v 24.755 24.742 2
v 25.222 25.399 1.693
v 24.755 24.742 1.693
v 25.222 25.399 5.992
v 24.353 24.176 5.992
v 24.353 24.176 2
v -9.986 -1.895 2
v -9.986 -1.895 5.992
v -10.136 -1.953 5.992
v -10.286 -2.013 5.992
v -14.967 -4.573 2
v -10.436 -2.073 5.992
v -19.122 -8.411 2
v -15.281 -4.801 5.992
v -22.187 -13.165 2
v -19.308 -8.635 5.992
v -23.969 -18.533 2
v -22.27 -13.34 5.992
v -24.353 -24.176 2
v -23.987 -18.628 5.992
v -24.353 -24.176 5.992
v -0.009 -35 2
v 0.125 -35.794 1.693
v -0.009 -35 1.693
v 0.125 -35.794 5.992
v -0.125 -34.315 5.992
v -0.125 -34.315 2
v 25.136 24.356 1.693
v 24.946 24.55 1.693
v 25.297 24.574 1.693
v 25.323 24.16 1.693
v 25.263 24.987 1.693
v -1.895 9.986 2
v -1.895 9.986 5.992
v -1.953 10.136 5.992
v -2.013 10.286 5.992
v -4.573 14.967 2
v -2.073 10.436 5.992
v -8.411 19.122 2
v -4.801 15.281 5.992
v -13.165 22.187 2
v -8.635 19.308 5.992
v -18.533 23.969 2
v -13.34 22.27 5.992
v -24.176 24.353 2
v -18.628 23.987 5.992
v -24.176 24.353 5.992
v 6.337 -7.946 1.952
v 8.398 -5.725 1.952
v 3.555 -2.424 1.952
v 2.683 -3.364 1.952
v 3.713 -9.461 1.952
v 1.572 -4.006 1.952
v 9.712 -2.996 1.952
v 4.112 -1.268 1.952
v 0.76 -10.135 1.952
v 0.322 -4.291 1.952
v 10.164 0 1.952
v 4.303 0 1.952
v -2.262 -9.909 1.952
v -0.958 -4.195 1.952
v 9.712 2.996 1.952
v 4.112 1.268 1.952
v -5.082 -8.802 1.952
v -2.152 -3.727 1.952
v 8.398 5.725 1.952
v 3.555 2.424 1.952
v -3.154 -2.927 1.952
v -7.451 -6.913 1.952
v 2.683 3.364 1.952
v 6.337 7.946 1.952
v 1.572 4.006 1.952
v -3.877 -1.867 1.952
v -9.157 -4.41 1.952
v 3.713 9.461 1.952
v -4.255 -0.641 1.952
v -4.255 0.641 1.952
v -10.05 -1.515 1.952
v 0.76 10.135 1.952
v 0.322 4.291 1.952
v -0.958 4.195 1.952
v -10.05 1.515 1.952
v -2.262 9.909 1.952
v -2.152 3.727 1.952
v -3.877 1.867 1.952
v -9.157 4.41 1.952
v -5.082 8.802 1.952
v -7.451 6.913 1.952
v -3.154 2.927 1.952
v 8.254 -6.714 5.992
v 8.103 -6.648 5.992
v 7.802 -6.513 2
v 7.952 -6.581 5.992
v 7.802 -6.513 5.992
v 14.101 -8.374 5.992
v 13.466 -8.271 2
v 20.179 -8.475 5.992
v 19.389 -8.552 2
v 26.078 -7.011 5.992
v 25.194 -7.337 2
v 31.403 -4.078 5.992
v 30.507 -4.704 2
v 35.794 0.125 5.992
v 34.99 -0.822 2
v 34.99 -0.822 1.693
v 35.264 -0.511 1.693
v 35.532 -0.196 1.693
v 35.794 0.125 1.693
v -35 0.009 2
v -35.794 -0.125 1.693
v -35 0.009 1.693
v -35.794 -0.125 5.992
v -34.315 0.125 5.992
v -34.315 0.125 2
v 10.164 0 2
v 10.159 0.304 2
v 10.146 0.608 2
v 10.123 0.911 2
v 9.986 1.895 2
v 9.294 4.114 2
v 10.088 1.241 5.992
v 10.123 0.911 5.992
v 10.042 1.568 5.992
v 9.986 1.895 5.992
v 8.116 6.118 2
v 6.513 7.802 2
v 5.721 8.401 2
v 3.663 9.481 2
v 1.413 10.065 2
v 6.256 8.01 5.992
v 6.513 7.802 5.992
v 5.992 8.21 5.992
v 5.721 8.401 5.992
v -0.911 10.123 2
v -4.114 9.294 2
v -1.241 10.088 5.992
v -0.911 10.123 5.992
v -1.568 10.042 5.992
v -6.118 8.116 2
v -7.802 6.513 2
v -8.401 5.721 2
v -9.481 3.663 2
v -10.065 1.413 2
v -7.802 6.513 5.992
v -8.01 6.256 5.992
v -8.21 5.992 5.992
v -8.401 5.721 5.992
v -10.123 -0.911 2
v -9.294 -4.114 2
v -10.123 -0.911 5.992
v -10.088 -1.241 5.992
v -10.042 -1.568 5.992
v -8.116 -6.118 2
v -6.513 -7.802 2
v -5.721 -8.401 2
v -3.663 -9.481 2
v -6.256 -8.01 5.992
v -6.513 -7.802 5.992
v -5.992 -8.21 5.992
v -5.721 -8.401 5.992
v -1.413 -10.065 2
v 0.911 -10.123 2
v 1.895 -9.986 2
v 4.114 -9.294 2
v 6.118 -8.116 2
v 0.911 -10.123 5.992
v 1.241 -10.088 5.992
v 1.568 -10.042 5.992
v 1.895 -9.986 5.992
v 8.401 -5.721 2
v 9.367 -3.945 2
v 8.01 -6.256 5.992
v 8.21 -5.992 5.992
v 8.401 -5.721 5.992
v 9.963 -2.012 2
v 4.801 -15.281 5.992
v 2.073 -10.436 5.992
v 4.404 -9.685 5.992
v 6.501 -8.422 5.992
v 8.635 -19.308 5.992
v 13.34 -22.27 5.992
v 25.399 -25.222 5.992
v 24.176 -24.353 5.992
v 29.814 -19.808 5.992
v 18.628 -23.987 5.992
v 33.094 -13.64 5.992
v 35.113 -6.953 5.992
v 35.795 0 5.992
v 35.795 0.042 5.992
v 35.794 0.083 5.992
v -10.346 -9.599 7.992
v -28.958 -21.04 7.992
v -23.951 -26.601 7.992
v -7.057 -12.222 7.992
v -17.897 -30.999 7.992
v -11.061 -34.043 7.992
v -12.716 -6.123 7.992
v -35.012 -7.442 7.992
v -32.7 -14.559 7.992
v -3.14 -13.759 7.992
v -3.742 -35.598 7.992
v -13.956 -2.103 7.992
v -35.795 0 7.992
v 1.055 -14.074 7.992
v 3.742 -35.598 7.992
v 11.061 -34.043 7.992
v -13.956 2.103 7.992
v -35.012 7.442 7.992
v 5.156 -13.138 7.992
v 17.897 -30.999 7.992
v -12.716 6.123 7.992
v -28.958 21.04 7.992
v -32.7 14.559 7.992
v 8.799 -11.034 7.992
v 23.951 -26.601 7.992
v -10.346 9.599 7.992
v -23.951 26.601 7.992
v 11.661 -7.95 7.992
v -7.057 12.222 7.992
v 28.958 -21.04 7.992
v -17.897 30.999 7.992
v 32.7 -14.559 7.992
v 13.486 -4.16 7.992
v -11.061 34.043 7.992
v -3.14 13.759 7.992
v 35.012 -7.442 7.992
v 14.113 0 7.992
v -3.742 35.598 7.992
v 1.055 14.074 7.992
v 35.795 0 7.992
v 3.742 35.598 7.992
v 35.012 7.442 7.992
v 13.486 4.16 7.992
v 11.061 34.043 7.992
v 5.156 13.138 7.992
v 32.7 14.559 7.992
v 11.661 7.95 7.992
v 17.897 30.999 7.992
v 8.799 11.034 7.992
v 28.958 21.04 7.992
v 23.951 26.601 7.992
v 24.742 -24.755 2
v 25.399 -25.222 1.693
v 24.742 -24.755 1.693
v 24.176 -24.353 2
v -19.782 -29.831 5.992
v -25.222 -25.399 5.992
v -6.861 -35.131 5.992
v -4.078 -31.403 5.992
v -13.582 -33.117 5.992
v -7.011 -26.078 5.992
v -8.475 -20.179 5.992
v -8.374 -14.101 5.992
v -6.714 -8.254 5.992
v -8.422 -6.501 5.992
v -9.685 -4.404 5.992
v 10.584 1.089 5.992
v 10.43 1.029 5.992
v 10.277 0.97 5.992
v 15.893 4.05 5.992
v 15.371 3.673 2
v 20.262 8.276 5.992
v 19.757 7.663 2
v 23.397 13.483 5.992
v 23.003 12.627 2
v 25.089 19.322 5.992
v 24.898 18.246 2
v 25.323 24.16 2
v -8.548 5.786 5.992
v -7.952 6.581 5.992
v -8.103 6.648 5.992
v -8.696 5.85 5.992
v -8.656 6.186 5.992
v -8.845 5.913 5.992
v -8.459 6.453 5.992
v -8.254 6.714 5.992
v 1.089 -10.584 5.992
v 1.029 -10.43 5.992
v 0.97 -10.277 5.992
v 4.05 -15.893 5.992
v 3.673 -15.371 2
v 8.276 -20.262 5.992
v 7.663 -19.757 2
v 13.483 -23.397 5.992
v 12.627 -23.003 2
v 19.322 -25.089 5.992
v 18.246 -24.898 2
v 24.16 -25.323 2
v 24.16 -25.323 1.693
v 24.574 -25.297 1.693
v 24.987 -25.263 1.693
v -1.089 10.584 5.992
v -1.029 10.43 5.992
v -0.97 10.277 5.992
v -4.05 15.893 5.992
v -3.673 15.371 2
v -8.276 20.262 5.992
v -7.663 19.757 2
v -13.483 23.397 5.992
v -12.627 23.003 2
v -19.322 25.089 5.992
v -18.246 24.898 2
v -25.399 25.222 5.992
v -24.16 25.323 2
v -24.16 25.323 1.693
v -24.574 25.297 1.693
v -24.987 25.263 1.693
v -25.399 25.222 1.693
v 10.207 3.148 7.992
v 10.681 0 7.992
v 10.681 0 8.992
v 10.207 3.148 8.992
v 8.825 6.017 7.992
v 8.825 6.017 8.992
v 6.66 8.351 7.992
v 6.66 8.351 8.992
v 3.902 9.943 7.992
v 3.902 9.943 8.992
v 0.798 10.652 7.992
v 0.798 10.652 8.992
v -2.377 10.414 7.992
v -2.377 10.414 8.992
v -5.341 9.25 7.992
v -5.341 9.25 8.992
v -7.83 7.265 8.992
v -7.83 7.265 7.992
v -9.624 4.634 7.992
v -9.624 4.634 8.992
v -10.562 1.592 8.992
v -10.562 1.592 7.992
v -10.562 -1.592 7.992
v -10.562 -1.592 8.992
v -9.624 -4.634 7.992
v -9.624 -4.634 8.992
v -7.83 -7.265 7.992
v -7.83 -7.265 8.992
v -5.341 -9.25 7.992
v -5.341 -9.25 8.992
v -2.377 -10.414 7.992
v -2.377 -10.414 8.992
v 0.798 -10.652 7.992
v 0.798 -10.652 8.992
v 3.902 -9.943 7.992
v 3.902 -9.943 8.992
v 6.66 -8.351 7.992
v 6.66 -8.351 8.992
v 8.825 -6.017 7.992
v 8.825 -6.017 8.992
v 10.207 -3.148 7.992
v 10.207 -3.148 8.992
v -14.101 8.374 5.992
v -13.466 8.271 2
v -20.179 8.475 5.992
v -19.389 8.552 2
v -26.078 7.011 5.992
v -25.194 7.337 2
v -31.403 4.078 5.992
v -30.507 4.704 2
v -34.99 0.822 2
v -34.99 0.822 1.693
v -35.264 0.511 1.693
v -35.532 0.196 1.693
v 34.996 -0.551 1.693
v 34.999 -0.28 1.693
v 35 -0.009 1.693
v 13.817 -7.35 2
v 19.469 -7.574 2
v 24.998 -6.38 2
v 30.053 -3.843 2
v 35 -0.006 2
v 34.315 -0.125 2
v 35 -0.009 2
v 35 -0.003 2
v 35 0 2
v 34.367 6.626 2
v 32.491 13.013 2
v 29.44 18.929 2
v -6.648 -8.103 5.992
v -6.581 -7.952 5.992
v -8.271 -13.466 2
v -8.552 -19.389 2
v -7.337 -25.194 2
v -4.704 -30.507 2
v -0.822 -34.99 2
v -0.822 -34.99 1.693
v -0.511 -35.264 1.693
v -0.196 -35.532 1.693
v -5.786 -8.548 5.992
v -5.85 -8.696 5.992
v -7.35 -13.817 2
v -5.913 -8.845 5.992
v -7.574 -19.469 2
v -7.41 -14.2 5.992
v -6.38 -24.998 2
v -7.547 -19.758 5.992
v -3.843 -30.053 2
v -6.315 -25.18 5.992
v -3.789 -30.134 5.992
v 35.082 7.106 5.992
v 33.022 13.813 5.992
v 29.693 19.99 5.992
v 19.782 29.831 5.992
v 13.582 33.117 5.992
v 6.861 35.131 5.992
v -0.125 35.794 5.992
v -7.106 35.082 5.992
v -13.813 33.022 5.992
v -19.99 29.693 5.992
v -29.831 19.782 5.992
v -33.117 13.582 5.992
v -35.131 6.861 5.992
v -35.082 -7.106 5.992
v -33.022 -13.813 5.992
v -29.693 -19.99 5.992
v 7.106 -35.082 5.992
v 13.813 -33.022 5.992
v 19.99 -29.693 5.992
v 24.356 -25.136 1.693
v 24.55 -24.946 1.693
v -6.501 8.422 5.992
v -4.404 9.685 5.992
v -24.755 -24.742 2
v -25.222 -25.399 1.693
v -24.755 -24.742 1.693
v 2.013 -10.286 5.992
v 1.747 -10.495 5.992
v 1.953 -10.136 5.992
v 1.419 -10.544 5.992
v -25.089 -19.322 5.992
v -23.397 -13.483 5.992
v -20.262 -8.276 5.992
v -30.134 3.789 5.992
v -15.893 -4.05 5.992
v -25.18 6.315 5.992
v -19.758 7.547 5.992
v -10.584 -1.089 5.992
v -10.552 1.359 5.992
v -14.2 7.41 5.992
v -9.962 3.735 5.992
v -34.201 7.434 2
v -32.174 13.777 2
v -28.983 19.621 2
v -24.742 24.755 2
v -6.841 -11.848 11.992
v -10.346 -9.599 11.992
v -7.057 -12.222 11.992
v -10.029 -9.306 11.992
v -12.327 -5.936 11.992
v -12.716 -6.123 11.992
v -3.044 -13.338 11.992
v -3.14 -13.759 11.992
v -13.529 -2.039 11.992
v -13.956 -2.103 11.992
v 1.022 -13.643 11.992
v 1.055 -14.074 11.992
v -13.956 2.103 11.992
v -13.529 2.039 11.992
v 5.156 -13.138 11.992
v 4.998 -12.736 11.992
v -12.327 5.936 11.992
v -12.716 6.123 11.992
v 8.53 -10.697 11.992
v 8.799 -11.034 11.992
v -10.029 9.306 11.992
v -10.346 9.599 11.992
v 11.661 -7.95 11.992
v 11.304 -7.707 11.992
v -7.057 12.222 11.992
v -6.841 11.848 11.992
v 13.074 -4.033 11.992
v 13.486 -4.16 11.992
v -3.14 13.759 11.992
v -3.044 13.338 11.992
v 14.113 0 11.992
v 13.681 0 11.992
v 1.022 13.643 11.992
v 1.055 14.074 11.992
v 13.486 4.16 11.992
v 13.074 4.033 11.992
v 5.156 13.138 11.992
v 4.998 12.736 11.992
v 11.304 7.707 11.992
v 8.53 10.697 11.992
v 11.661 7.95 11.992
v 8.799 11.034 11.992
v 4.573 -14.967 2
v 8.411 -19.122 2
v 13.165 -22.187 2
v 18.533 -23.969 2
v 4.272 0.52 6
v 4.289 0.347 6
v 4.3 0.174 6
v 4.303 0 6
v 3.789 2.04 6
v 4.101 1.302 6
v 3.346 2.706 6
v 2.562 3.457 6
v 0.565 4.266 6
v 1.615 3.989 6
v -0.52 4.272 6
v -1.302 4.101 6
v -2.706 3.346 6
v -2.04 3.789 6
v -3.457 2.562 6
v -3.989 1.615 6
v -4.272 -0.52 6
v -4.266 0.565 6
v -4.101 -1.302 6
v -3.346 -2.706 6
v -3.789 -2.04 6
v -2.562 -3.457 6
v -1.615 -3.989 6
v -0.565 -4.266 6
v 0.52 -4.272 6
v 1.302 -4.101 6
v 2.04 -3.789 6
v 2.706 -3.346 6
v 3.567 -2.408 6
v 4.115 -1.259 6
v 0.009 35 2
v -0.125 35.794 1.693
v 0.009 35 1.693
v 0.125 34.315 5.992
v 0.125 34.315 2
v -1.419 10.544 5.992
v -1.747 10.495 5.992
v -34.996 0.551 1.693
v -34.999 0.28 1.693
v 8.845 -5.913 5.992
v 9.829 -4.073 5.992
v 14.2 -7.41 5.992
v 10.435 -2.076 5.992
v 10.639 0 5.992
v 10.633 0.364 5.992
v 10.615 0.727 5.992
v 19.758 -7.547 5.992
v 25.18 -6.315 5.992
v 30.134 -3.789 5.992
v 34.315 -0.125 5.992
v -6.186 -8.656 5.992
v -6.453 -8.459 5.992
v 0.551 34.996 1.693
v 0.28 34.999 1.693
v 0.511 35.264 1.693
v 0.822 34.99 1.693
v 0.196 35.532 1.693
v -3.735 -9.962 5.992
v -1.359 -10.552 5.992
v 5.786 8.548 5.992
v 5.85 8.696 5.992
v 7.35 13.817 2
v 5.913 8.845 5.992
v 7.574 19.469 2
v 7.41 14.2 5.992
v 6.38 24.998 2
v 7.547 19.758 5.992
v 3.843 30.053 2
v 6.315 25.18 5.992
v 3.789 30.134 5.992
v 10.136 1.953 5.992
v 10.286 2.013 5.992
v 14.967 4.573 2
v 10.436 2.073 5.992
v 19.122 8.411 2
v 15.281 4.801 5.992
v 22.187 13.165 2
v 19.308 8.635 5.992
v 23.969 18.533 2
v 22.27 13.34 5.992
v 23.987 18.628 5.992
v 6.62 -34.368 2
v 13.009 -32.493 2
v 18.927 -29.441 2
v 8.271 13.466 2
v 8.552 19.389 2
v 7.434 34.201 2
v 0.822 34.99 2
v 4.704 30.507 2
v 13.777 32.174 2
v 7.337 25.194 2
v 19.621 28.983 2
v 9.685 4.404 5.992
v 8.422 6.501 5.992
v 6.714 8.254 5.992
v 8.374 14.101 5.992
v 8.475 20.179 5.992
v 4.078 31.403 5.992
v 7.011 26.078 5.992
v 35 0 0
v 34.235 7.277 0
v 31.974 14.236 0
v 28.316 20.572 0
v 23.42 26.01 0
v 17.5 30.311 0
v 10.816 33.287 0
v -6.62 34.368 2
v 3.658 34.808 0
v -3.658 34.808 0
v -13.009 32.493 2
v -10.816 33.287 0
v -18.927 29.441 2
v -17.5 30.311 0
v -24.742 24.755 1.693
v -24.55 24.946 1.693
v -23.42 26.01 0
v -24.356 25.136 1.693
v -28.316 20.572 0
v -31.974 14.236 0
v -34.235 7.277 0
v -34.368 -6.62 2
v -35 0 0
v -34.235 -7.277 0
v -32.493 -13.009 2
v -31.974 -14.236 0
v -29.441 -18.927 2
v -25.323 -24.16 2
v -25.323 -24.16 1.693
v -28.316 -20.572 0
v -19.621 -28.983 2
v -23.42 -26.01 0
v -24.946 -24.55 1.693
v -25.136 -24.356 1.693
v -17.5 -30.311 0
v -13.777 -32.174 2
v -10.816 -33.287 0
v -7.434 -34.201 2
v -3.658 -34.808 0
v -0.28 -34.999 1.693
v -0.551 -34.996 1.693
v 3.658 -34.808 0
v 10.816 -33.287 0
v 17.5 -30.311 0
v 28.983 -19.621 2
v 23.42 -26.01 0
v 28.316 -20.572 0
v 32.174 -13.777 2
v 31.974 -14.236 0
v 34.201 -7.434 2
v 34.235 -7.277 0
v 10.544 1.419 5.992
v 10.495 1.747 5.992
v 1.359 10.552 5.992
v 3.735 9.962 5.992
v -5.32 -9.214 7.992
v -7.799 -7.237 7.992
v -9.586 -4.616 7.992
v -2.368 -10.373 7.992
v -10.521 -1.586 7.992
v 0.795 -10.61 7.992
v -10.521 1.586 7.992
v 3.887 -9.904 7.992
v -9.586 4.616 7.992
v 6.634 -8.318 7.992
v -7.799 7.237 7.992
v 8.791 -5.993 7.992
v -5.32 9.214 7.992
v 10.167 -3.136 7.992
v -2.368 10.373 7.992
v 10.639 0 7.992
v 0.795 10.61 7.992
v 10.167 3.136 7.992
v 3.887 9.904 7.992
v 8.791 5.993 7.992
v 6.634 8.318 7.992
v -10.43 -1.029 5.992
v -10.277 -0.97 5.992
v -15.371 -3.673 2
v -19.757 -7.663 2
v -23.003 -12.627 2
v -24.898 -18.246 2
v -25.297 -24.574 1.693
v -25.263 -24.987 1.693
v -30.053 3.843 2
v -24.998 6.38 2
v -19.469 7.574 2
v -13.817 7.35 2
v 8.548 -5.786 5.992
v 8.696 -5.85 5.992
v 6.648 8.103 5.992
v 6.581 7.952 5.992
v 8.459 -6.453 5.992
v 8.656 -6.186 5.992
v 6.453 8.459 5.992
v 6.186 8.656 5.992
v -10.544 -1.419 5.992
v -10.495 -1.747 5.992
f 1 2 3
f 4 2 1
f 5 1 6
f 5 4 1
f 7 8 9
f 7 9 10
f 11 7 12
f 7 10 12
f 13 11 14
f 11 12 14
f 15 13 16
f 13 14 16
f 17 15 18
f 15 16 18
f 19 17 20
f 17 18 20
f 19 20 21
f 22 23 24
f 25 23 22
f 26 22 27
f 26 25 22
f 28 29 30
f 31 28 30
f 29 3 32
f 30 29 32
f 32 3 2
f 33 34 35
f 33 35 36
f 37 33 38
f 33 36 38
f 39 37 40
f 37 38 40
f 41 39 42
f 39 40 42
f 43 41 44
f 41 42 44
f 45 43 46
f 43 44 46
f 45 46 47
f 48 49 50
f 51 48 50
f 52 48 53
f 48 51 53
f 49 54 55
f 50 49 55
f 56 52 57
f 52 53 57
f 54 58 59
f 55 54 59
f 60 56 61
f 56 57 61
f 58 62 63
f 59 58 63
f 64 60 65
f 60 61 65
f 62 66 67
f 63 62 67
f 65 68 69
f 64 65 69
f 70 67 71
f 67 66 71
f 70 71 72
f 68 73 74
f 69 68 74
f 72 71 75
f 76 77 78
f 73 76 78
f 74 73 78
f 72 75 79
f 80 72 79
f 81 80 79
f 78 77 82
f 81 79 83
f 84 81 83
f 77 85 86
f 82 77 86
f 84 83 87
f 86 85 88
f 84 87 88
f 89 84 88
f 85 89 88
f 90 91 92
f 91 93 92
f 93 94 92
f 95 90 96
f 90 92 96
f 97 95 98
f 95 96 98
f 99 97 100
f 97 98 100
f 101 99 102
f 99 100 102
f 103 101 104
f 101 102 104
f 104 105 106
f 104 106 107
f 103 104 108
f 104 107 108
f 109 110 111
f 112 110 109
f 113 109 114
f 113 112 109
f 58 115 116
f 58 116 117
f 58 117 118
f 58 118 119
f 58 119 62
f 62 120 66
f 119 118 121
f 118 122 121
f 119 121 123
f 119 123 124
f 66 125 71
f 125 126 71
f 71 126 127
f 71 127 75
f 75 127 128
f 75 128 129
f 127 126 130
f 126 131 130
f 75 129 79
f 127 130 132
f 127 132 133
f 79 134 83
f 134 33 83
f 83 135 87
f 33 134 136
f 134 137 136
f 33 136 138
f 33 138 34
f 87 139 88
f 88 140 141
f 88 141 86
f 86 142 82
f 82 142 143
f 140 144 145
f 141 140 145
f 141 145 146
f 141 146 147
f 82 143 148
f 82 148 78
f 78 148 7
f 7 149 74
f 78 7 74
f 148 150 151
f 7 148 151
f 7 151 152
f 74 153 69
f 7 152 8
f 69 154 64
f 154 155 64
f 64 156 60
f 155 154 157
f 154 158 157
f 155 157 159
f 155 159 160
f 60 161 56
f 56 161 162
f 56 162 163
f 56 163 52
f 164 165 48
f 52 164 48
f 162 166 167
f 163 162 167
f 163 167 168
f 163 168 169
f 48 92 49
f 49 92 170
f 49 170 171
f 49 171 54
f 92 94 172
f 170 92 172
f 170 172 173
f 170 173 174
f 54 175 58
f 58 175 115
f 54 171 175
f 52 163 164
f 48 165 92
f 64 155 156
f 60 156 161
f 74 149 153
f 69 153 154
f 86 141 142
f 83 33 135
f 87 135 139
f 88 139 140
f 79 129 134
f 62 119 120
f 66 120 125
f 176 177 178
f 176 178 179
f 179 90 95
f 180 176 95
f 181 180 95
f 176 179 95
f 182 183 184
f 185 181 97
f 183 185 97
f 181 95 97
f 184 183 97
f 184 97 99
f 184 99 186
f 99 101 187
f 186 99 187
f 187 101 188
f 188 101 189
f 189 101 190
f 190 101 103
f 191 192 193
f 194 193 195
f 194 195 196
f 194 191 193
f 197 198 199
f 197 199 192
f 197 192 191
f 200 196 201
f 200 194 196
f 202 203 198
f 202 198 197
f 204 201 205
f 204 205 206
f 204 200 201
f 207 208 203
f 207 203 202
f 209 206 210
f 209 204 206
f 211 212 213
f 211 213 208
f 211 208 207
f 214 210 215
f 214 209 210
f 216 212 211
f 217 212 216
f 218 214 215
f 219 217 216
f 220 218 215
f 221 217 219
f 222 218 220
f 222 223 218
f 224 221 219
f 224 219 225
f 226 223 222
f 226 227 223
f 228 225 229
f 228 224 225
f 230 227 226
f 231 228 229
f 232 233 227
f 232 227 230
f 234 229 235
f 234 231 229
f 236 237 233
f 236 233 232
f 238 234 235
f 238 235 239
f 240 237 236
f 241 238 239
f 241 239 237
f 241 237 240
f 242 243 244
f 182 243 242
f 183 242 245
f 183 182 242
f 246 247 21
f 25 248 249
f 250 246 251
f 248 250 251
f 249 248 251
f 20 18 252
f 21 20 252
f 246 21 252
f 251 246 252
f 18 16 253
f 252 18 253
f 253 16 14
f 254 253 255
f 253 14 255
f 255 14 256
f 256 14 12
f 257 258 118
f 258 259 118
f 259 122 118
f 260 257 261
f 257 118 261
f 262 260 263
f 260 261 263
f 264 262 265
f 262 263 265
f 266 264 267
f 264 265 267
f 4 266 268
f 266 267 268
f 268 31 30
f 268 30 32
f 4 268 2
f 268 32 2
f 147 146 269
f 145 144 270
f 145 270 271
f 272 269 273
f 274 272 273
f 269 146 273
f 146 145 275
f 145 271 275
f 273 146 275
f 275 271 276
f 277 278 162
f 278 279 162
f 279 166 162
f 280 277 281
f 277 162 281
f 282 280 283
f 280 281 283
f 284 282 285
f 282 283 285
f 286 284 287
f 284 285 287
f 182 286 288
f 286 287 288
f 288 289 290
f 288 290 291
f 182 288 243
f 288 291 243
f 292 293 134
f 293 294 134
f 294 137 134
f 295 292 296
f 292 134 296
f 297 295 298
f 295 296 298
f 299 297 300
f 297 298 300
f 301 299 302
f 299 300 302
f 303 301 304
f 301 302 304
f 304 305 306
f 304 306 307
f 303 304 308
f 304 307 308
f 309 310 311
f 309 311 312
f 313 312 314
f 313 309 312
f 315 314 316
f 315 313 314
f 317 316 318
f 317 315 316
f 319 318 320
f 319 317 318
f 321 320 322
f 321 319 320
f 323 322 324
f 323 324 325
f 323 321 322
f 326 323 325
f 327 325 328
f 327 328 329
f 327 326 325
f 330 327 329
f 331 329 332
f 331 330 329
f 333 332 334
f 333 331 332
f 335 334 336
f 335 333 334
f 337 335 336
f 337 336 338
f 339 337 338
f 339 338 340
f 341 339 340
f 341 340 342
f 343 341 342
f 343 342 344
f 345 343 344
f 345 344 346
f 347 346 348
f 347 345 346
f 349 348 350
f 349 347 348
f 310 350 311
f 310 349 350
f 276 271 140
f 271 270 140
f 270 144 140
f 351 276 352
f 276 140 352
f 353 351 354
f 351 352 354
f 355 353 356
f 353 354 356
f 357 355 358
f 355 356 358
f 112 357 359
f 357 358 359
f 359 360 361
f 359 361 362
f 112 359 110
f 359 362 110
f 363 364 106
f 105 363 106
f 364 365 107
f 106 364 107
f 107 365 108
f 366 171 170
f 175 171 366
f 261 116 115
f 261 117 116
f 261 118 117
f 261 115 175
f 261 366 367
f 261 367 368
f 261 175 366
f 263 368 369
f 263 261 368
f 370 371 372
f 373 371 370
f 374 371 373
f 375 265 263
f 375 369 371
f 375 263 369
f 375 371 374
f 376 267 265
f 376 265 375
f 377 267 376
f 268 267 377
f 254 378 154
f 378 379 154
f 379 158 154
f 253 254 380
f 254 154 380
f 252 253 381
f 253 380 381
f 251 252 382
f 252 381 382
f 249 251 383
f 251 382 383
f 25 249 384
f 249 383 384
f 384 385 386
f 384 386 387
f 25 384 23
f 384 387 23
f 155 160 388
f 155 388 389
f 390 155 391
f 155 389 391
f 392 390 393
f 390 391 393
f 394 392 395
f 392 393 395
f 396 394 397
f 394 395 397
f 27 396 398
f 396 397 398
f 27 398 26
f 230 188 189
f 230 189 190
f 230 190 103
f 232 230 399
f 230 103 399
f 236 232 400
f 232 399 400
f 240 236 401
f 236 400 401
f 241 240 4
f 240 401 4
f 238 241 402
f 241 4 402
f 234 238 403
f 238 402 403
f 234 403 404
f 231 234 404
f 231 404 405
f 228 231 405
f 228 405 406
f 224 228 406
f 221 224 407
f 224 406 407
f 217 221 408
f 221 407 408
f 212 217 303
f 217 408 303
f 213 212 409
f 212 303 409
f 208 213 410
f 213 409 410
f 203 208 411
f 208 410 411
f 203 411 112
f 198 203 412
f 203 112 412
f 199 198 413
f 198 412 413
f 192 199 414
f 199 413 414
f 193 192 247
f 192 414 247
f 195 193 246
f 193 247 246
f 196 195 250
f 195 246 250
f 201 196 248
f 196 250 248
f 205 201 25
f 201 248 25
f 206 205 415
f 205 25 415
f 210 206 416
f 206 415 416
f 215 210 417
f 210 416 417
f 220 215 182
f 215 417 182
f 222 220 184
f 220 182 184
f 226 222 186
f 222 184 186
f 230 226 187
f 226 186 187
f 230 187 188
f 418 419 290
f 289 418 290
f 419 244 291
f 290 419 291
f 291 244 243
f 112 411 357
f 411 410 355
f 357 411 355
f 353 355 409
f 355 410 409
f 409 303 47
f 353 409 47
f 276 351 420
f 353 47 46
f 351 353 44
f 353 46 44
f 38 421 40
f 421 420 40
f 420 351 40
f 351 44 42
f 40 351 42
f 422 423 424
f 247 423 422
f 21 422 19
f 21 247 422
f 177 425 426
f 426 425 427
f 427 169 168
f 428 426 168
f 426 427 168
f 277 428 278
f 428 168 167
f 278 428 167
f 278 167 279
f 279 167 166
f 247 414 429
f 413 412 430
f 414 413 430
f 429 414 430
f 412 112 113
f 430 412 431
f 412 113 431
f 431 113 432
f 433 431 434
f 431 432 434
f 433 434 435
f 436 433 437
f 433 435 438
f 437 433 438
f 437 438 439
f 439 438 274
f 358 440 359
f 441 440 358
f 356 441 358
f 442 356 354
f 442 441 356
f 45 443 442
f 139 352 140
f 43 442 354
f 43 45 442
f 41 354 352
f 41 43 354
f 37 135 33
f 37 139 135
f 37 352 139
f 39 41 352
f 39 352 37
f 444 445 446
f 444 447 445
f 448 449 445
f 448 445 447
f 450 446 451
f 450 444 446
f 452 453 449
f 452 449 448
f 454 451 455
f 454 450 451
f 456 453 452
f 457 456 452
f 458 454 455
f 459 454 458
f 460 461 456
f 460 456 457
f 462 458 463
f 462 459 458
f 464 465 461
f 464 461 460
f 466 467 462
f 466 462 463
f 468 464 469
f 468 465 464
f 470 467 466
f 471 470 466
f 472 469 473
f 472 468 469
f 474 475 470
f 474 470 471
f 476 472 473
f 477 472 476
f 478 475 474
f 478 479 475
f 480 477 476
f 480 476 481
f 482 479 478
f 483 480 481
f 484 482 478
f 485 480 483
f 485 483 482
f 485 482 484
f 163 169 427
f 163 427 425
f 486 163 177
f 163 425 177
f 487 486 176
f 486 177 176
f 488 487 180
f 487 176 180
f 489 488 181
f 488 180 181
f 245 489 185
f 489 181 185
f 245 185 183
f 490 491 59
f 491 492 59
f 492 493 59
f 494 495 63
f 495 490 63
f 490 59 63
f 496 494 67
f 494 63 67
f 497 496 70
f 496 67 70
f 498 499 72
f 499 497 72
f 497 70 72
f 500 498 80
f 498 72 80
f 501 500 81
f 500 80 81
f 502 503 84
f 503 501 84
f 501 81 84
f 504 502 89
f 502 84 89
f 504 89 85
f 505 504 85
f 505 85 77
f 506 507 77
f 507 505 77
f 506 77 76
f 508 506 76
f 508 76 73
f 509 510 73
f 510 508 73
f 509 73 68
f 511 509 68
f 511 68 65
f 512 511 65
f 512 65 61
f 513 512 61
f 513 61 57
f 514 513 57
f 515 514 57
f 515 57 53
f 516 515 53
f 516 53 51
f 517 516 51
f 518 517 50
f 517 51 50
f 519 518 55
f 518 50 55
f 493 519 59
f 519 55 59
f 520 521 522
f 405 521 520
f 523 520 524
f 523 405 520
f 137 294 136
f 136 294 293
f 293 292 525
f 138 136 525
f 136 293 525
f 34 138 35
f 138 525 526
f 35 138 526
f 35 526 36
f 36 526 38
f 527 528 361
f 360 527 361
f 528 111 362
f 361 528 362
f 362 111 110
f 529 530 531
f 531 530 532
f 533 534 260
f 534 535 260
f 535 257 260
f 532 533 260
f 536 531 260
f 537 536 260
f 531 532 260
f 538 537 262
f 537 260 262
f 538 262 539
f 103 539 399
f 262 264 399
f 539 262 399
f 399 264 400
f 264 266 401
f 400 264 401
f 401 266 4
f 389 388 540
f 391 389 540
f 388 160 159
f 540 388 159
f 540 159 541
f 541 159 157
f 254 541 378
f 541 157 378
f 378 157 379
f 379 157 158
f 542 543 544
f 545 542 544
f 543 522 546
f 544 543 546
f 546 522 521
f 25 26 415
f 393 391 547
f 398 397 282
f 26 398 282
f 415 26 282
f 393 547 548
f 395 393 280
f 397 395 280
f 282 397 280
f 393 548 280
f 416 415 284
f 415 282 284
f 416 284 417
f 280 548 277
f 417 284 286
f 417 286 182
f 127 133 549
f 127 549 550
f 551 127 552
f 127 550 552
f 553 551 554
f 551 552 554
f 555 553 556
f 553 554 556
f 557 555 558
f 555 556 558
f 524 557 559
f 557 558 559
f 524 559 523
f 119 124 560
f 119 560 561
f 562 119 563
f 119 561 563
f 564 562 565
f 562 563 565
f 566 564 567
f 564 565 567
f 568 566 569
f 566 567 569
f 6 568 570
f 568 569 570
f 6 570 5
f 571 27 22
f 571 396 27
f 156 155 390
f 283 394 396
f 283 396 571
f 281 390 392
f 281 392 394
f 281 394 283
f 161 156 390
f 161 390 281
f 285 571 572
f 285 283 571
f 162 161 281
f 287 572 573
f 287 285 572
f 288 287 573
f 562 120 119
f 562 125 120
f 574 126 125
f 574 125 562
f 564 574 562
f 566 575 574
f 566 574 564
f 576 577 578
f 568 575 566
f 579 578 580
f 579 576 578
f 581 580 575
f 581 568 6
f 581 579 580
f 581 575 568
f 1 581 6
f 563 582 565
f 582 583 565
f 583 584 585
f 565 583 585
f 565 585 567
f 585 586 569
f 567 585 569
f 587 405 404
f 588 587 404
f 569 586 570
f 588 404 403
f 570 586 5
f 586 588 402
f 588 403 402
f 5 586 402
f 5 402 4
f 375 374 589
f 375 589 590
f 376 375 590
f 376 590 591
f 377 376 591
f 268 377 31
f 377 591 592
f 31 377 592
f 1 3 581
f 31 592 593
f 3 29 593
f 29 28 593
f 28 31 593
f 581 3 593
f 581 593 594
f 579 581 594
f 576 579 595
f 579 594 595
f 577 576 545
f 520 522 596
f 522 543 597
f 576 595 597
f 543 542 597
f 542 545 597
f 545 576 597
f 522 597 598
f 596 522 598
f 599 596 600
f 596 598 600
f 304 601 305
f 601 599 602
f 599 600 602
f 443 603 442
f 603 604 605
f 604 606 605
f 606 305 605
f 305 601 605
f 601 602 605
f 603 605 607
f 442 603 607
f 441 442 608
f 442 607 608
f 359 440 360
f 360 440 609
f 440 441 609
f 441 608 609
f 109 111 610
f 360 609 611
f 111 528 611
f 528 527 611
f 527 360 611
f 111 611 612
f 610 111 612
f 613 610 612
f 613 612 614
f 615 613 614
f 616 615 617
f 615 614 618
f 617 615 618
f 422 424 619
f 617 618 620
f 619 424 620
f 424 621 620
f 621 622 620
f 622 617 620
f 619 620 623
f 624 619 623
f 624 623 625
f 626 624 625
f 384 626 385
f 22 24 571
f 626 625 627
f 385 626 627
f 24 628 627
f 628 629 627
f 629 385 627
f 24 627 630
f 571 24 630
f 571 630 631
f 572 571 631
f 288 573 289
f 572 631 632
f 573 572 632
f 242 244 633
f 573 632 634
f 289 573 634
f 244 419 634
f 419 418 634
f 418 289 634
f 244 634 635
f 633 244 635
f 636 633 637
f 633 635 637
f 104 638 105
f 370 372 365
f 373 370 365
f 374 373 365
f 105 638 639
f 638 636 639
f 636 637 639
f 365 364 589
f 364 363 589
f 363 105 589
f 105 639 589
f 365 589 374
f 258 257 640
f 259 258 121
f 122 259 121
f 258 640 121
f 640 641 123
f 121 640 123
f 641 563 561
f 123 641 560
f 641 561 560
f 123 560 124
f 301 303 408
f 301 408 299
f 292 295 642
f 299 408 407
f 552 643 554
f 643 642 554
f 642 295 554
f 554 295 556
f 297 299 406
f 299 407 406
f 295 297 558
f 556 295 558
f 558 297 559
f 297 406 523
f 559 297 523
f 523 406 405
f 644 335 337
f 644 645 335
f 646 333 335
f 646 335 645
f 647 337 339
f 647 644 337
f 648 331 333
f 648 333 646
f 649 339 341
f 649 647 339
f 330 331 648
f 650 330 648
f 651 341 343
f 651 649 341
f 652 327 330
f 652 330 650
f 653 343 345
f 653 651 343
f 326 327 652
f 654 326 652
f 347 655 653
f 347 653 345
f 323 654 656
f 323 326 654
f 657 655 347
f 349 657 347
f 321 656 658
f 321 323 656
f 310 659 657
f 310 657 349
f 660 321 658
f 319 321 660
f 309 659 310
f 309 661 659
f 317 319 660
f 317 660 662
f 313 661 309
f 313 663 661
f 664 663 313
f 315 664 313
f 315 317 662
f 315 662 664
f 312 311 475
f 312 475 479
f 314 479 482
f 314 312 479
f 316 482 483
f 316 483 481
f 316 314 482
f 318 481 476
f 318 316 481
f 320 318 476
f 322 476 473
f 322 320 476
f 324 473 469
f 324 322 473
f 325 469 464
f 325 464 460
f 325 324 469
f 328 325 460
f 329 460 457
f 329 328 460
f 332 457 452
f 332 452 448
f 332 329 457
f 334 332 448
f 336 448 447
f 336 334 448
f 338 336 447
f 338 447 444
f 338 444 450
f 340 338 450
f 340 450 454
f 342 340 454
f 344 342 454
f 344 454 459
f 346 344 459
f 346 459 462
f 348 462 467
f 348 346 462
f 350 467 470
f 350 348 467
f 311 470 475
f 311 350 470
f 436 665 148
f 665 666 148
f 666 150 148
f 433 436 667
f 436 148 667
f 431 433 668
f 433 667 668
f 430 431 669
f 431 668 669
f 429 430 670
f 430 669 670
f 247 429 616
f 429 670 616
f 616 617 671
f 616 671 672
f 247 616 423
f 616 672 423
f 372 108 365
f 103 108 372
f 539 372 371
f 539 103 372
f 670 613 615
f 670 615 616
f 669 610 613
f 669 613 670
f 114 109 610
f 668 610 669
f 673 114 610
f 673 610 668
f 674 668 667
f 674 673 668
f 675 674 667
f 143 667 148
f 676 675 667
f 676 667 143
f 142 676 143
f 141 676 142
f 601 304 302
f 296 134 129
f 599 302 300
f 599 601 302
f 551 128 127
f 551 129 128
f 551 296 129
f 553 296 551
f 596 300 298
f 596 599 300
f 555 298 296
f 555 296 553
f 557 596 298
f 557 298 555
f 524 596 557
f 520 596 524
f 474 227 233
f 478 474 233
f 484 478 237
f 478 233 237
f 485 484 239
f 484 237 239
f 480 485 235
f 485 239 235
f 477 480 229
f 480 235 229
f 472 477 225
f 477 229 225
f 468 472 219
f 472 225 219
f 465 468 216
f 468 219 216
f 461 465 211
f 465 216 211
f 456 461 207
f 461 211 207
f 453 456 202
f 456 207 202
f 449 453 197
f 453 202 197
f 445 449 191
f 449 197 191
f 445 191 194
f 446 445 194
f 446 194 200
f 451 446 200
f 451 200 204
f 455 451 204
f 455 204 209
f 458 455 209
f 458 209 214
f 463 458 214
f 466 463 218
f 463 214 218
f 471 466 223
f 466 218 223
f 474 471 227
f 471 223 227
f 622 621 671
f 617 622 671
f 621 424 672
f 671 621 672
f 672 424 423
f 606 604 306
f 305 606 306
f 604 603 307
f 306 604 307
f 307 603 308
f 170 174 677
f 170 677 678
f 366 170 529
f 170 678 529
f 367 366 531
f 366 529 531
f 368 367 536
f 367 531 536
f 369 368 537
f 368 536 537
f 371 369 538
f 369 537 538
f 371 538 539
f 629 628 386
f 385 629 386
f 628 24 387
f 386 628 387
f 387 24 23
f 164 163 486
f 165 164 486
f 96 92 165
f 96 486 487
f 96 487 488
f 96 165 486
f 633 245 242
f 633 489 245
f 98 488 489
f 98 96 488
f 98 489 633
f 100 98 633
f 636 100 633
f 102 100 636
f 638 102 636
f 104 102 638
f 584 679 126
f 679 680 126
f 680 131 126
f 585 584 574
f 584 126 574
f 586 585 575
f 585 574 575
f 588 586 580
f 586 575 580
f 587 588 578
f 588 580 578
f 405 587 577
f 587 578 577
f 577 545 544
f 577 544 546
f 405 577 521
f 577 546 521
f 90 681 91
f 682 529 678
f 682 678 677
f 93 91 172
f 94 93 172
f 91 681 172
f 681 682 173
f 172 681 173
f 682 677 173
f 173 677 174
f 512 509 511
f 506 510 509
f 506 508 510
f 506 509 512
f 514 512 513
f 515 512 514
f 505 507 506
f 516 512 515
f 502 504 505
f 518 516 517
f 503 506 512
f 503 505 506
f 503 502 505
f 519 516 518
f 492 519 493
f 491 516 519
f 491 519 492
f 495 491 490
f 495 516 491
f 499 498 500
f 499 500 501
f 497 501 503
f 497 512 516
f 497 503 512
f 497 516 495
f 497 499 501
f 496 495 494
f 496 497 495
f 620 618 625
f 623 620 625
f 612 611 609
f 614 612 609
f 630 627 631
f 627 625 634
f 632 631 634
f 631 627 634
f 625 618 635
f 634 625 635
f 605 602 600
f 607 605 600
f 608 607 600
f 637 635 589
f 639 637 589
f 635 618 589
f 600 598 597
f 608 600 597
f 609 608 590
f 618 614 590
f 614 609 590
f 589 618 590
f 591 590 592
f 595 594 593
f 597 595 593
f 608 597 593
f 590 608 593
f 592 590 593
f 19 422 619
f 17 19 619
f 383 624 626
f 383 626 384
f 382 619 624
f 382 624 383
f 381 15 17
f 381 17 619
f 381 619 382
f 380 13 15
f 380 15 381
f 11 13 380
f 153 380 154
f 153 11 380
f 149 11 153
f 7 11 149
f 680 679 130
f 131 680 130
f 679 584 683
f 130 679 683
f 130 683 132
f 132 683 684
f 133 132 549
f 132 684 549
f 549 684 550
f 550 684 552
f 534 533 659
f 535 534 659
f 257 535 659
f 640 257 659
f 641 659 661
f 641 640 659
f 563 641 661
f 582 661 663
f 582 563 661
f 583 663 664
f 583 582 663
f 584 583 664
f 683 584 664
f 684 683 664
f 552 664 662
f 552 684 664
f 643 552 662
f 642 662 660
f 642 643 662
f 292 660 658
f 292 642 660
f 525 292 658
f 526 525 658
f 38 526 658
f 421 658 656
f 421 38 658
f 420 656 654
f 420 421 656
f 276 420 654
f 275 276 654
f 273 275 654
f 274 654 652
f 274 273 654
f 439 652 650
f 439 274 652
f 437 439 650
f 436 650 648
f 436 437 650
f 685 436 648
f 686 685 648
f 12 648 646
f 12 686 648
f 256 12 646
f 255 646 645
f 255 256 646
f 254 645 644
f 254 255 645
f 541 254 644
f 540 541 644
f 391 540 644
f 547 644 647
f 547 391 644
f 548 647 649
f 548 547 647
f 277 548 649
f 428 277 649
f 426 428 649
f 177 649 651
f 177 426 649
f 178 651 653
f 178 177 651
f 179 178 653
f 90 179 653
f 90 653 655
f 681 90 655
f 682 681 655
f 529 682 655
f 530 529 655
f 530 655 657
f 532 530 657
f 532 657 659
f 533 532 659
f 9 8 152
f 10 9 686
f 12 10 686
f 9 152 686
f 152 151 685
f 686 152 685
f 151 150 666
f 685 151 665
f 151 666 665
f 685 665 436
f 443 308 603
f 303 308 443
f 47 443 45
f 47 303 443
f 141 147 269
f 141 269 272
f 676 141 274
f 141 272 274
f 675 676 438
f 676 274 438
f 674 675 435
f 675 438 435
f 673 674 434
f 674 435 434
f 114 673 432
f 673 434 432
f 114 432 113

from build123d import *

# Parameters (mm, degrees)
F0_R      = 35
F1_DEPTH  = 2
F2_R      = 5
F3_DEPTH  = 4
F4_W      = 1.5
F4_H      = 8.0229806336
F7_COUNT  = 8
F8_W      = 26.6654435545
F8_H      = 7.6421163976
F10_R     = 35.7945573746
F10_R_2   = 10.639493897
F11_DEPTH = 2
F12_R     = 7.8850304464
F13_DEPTH = 25
F14_R     = 14.11317868
F14_R_2   = 10.6813839673
F15_DEPTH = 4
F16_SIZE  = 3


with BuildPart() as f1:
    # F0 (on Top) → F1 (new body)
    with BuildSketch(Plane.XY):
        Circle(F0_R)
    extrude(amount=F1_DEPTH)



with BuildPart() as f3:
    # F2 (on face) → F3 (new body)
    with BuildSketch(Plane.XY.offset(2)):
        Circle(F2_R)
    extrude(amount=F3_DEPTH)


with BuildPart() as f6:
    # F6: sweep along a path in F5
    with BuildLine(Plane.XY) as f6_path:
        ThreePointArc((0, 0), (-8.1347441665, -17.5274070352), (0, -35.0548140705))
    # F4 (on Front) → F6 (sweep)
    with BuildSketch(Plane.XZ):
        with Locations((0, 5.7041863911)):
            Rectangle(F4_W, F4_H)
    sweep(path=f6_path.line)


with BuildPart() as f1_1:
    add(f1.part)

    add(f3.part)  # F7 merges F3

    add(f6.part)  # F7 merges F6
    # F7: F6 ×8 about axis
    f7_axis = Axis((0, 0, 6), (0, 0, 1))
    for i in range(1, F7_COUNT):
        add(f6.part.rotate(f7_axis, i * 360 / F7_COUNT))

    # F8 (on Front) → F9 (revolve, cut)
    with BuildSketch(Plane.XZ):
        with Locations((23.4964704141, 9.8134223372)):
            Rectangle(F8_W, F8_H)
        Polygon((10.1637486368, 5.9923641384), (10.1637486368, 13.634480536), (4.3031405658, 13.634480536), (4.3031405658, 1.9518490881), (10.1637486368, 1.9518490881), align=None)
    revolve(axis=Axis((0, 0, 0), (0, 0, 1)), mode=Mode.SUBTRACT)

    # F10 (on face) → F11 (join)
    with BuildSketch(Plane.XY.offset(5.9923641384)):
        Circle(F10_R)
        Circle(F10_R_2, mode=Mode.SUBTRACT)
    extrude(amount=F11_DEPTH)

    # F12 (on face) → F13 (cut)
    with BuildSketch(Plane.XY.offset(6)):
        Circle(F12_R)
        with BuildLine():
            ThreePointArc((-0.4521737471, -4.2793174258), (-1.6150666235, -3.9885559455), (-2.6526354387, -3.3882951404))
            ThreePointArc((-2.6526354387, -3.3882951404), (-1.6440902169, -2.2260491927), (-0.5583723561, -1.1355466324))
            ThreePointArc((-0.5583723561, -1.1355466324), (-0.5580653725, -2.7092153878), (-0.4521737471, -4.2793174258))
        make_face(mode=Mode.SUBTRACT)
        with BuildLine():
            ThreePointArc((-3.3456694935, -2.7061992478), (-3.9623595177, -1.6783103947), (-4.2715829771, -0.5201899637))
            ThreePointArc((-4.2715829771, -0.5201899637), (-2.7366018207, -0.4115071382), (-1.1977816036, -0.4081238447))
            ThreePointArc((-1.1977816036, -0.4081238447), (-2.3103163817, -1.5210927632), (-3.3456694935, -2.7061992478))
        make_face(mode=Mode.SUBTRACT)
        with BuildLine():
            ThreePointArc((2.7061992478, -3.3456694935), (1.6783103947, -3.9623595177), (0.5201899637, -4.2715829771))
            ThreePointArc((0.5201899637, -4.2715829771), (0.4115071382, -2.7366018207), (0.4081238447, -1.1977816036))
            ThreePointArc((0.4081238447, -1.1977816036), (1.5210927632, -2.3103163817), (2.7061992478, -3.3456694935))
        make_face(mode=Mode.SUBTRACT)
        with BuildLine():
            ThreePointArc((4.2793174258, -0.4521737471), (3.9885559455, -1.6150666235), (3.3882951404, -2.6526354387))
            ThreePointArc((3.3882951404, -2.6526354387), (2.2260491927, -1.6440902169), (1.1355466324, -0.5583723561))
            ThreePointArc((1.1355466324, -0.5583723561), (2.7092153878, -0.5580653725), (4.2793174258, -0.4521737471))
        make_face(mode=Mode.SUBTRACT)
        with BuildLine():
            ThreePointArc((-4.2793174258, 0.4521737471), (-3.9885559455, 1.6150666235), (-3.3882951404, 2.6526354387))
            ThreePointArc((-3.3882951404, 2.6526354387), (-2.2260491927, 1.6440902169), (-1.1355466324, 0.5583723561))
            ThreePointArc((-1.1355466324, 0.5583723561), (-2.7092153878, 0.5580653725), (-4.2793174258, 0.4521737471))
        make_face(mode=Mode.SUBTRACT)
        with BuildLine():
            ThreePointArc((-2.7061992478, 3.3456694935), (-1.6783103947, 3.9623595177), (-0.5201899637, 4.2715829771))
            ThreePointArc((-0.5201899637, 4.2715829771), (-0.4115071382, 2.7366018207), (-0.4081238447, 1.1977816036))
            ThreePointArc((-0.4081238447, 1.1977816036), (-1.5210927632, 2.3103163817), (-2.7061992478, 3.3456694935))
        make_face(mode=Mode.SUBTRACT)
        with BuildLine():
            ThreePointArc((3.3456694935, 2.7061992478), (3.9623595177, 1.6783103947), (4.2715829771, 0.5201899637))
            ThreePointArc((4.2715829771, 0.5201899637), (2.7366018207, 0.4115071382), (1.1977816036, 0.4081238447))
            ThreePointArc((1.1977816036, 0.4081238447), (2.3103163817, 1.5210927632), (3.3456694935, 2.7061992478))
        make_face(mode=Mode.SUBTRACT)
        with BuildLine():
            ThreePointArc((0.4521737471, 4.2793174258), (1.6150666235, 3.9885559455), (2.6526354387, 3.3882951404))
            ThreePointArc((2.6526354387, 3.3882951404), (1.6440902169, 2.2260491927), (0.5583723561, 1.1355466324))
            ThreePointArc((0.5583723561, 1.1355466324), (0.5580653725, 2.7092153878), (0.4521737471, 4.2793174258))
        make_face(mode=Mode.SUBTRACT)
    extrude(amount=F13_DEPTH, mode=Mode.SUBTRACT)

    # F14 (on face) → F15 (join)
    with BuildSketch(Plane.XY.offset(7.9923641384)):
        Circle(F14_R)
        Circle(F14_R_2, mode=Mode.SUBTRACT)
    extrude(amount=F15_DEPTH)

    # F16
    f16_edges = [f1_1.edges().sort_by_distance(p)[0] for p in [
        (-10.681384, 0, 11.992364),
    ]]
    chamfer(f16_edges, length=F16_SIZE)


solid = f1_1.part
